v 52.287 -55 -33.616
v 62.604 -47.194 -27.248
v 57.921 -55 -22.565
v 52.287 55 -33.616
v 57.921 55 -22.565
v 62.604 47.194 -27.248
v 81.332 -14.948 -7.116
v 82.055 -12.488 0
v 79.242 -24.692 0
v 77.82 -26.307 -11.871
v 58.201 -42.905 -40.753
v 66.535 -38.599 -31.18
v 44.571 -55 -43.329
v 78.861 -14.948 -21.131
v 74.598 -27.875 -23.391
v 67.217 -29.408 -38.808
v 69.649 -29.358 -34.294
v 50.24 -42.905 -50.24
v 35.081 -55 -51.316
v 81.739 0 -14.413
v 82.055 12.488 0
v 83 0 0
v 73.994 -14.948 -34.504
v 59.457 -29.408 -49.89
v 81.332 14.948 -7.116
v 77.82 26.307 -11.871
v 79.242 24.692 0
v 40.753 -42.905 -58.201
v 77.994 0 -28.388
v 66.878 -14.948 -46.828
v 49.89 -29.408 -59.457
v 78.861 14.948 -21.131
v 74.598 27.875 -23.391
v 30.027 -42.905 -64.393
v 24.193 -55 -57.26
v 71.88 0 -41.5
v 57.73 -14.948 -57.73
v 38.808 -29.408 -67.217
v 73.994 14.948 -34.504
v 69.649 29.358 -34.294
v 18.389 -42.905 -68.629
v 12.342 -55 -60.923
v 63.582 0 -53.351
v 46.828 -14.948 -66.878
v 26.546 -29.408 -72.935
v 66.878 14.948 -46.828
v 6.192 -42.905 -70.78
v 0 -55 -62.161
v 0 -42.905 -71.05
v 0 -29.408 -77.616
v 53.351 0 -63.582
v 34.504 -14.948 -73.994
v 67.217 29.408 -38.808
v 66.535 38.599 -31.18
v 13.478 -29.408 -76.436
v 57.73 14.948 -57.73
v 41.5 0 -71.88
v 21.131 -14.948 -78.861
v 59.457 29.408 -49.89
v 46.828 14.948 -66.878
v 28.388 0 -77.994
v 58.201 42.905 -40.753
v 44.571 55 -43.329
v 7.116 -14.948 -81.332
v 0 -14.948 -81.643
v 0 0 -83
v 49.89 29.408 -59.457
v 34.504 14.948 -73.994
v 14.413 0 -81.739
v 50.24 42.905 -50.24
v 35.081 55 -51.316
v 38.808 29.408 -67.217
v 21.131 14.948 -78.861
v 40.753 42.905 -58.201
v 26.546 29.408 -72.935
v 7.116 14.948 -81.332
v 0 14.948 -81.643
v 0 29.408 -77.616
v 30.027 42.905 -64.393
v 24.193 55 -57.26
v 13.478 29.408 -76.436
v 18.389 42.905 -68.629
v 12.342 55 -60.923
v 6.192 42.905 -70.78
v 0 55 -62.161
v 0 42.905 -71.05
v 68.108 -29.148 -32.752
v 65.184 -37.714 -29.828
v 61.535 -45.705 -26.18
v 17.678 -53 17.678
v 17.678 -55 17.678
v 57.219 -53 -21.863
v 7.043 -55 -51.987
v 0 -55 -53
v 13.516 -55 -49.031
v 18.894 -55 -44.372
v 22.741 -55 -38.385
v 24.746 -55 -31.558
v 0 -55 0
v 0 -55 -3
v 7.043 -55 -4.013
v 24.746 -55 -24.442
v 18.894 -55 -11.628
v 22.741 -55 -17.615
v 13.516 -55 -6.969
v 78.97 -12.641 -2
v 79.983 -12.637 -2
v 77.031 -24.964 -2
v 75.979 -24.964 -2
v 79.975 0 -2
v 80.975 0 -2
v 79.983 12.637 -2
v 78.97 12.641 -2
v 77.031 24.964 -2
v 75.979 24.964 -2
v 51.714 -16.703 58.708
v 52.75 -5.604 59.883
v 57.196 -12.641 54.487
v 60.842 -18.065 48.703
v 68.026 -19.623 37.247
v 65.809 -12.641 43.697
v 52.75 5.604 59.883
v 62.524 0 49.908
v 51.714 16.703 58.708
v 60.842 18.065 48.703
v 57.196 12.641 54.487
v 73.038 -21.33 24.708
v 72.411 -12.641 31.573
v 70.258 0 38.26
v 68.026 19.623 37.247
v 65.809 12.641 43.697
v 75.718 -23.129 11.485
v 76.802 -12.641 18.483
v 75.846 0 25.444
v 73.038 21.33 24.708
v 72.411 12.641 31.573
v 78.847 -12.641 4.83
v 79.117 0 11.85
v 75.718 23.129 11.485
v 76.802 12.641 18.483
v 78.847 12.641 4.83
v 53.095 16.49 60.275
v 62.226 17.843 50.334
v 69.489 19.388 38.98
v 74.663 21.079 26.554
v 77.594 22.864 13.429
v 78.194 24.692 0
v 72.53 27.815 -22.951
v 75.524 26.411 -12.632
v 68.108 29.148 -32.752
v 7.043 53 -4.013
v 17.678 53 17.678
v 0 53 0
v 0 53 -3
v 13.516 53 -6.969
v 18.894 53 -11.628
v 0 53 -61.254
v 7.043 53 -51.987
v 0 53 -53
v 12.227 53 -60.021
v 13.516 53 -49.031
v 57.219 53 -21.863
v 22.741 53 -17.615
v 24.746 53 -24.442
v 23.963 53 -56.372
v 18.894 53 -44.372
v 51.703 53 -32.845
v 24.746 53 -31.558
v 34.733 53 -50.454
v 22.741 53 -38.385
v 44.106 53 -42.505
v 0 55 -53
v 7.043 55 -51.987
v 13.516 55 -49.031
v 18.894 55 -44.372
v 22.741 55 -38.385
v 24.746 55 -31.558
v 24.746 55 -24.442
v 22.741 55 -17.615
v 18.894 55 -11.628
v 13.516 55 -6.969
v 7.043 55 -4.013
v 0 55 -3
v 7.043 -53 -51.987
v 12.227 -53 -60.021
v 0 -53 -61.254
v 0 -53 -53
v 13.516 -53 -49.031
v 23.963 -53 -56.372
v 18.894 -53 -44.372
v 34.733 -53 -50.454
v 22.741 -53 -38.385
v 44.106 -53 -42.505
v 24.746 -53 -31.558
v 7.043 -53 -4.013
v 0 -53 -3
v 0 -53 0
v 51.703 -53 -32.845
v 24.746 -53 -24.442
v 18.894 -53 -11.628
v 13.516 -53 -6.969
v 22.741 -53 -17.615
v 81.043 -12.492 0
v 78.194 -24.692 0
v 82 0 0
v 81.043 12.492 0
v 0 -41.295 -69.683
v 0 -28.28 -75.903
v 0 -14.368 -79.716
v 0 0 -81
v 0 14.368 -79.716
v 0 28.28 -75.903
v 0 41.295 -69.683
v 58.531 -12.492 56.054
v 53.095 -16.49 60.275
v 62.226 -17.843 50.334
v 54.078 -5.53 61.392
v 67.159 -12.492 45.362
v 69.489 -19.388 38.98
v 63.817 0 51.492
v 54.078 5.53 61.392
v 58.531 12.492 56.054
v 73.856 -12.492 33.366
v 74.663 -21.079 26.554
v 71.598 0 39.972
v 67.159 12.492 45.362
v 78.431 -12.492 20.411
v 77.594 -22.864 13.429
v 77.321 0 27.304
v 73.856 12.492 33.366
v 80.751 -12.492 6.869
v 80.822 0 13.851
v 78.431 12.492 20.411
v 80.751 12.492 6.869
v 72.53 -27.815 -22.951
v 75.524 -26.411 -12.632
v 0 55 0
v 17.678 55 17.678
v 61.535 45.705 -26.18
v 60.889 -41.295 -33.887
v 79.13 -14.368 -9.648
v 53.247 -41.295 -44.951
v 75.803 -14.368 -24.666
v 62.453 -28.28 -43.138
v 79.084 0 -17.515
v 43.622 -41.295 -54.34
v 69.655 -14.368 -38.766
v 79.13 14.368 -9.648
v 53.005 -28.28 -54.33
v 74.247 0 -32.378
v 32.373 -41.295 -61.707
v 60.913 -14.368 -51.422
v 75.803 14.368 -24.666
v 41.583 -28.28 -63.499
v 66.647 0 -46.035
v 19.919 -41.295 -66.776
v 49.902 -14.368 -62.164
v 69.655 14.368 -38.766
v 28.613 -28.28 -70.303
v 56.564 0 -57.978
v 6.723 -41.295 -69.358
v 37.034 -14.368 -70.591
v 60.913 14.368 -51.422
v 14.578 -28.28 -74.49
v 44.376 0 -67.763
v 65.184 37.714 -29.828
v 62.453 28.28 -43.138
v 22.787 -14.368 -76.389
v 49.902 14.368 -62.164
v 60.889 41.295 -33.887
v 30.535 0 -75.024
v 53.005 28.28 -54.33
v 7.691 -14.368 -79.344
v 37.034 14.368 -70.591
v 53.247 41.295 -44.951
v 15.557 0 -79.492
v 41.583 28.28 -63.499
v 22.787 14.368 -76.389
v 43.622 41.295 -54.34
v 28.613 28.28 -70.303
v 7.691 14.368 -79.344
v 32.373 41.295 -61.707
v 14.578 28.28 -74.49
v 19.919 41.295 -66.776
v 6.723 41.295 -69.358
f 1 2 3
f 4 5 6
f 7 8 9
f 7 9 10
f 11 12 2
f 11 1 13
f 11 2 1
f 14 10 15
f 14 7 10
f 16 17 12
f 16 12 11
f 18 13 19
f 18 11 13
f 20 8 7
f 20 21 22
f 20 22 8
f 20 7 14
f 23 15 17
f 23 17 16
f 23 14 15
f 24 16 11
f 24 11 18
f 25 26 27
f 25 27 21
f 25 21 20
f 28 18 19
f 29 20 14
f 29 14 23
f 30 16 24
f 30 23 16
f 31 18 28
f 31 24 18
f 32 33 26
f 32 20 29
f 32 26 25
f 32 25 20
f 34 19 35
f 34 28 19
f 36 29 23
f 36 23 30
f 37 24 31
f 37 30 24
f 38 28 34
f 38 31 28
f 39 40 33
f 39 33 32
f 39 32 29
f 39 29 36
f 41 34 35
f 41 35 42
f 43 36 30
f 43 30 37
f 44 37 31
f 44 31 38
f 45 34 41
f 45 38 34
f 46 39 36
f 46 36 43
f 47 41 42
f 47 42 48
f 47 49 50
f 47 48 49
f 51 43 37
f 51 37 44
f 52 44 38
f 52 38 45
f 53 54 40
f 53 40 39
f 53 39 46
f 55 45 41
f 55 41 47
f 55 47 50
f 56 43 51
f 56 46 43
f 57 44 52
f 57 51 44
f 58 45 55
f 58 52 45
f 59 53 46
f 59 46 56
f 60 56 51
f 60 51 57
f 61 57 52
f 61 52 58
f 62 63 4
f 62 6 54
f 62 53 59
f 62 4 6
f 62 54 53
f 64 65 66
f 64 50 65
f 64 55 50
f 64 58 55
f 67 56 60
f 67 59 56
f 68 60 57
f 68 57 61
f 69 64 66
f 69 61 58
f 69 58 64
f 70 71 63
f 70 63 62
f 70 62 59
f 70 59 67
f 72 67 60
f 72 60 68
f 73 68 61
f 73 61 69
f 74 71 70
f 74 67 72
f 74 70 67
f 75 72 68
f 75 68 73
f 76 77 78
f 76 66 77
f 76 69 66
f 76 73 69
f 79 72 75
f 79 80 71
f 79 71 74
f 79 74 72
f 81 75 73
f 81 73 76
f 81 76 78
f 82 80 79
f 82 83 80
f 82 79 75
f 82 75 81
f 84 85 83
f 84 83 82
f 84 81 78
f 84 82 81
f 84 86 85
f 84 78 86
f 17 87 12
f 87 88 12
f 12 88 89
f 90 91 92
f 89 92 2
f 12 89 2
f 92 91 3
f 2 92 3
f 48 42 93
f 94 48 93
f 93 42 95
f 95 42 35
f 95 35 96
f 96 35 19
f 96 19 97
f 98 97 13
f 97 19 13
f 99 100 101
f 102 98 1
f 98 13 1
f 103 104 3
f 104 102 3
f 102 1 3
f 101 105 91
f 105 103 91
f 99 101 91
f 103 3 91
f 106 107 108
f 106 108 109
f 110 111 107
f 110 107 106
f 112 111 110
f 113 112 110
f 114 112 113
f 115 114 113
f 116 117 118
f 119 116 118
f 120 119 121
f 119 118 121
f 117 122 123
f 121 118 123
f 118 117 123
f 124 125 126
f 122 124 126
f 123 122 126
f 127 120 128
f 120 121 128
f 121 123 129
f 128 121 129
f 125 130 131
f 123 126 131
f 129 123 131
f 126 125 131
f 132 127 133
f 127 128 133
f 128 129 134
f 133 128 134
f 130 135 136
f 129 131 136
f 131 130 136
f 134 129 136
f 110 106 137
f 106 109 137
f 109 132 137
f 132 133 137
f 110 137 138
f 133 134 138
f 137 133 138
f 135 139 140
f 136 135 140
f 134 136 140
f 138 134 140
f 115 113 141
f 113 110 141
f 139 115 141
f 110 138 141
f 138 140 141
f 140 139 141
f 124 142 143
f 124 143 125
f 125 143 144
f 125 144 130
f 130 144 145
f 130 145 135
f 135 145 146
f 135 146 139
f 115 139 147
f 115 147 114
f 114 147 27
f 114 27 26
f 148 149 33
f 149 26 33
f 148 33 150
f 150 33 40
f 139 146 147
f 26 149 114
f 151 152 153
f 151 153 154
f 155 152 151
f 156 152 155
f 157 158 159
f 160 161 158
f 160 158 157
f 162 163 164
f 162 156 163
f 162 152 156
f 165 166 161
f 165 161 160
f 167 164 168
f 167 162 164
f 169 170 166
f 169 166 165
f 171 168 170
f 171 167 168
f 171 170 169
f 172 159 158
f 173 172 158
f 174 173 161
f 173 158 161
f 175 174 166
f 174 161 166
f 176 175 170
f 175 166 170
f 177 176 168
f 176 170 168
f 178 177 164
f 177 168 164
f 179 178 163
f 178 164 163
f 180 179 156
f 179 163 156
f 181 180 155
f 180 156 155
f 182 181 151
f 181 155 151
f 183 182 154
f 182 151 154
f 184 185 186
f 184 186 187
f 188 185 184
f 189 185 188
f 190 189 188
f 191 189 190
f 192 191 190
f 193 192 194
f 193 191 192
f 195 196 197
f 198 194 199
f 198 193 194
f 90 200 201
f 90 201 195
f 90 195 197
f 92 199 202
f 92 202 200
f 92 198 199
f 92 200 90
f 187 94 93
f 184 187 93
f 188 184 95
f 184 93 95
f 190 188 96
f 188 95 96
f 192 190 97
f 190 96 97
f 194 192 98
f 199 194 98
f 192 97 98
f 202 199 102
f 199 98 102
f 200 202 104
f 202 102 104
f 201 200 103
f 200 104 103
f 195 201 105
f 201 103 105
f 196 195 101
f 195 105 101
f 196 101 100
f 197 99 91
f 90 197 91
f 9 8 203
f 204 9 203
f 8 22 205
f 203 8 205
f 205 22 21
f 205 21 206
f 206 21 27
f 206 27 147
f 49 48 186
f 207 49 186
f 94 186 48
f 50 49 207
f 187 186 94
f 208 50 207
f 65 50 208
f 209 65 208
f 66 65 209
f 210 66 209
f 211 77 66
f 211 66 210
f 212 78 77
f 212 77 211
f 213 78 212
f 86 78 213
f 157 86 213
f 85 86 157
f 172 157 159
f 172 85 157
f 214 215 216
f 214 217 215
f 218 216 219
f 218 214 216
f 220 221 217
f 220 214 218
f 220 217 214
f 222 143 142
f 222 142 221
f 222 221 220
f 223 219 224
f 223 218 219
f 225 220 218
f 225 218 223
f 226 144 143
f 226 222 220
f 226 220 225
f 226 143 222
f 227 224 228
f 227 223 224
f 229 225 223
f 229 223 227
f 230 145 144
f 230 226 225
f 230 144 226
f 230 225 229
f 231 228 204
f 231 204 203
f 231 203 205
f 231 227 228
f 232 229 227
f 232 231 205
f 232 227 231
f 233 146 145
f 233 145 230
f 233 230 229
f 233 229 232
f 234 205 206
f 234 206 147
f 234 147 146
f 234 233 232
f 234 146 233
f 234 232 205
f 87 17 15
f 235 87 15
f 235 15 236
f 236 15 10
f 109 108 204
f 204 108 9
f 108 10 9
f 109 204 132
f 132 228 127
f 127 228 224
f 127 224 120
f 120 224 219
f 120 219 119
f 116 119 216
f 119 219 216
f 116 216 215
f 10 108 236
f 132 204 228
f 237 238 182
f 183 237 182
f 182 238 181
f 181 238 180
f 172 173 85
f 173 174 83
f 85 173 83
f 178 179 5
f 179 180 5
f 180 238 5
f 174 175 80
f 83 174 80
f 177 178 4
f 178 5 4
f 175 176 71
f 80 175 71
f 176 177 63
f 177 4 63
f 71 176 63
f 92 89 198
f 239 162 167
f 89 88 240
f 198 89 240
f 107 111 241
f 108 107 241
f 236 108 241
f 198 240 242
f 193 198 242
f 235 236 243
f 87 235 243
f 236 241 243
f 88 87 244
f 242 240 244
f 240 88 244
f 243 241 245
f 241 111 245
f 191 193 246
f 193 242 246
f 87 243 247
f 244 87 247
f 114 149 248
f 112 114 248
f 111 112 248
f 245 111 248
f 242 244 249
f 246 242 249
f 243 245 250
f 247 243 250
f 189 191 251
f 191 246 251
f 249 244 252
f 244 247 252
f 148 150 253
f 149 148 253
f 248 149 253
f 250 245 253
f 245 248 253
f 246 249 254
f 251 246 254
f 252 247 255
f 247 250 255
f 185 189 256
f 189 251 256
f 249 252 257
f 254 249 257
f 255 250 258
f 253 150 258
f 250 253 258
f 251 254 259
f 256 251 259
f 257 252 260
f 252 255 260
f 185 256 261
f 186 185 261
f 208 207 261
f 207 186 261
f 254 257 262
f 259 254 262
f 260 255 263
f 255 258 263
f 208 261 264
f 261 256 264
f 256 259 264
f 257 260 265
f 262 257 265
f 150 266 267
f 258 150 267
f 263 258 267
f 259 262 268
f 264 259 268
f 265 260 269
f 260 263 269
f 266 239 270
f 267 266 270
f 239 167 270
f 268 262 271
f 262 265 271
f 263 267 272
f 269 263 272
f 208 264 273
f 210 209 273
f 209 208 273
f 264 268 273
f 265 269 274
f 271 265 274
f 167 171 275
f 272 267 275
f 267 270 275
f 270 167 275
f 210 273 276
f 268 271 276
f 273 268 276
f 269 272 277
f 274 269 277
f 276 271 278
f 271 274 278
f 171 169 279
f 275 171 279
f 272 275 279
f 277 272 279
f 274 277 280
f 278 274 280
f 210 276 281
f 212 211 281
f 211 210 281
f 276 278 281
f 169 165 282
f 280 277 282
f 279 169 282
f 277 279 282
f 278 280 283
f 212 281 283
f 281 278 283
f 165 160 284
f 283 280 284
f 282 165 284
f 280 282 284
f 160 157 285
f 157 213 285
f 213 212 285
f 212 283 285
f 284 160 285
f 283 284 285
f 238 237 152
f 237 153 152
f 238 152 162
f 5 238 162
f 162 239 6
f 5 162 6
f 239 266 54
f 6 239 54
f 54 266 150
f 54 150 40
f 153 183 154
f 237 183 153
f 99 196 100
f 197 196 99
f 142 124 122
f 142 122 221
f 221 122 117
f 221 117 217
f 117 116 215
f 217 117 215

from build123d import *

# Parameters (mm, degrees)
REVOLVE1_ANGLE      = 180
CUT_EXTRUDE1_DEPTH  = 173.874496063
BOSS_EXTRUDE1_DEPTH = 100
CUT_EXTRUDE2_DEPTH  = 161.866404199
CUT_REVOLVE2_ANGLE  = 90
SKETCH7_R           = 25
CUT_EXTRUDE3_DEPTH  = 161.866404199
SHELL1_T            = -2


with BuildPart() as part:
    # Sketch1 → Revolve1 (revolve)
    with BuildSketch(Plane(origin=(0, 0, 0), x_dir=(0, 0, -1), z_dir=(1, 0, 0))):
        with BuildLine():
            Line((0, -55), (0, 55))
            Line((0, 55), (-76.60153846, 55))
            ThreePointArc((-76.60153846, 55), (-94.301620847, 0), (-76.60153846, -55))
            Line((-76.60153846, -55), (0, -55))
        make_face()
    revolve(axis=Axis((0, -55, 0), (0, 1, 0)), revolution_arc=REVOLVE1_ANGLE)

    # Sketch2 → Cut-Extrude1 (cut, through all)
    with BuildSketch(Plane.XZ.offset(55)):
        Polygon((0, 0), (17.67766953, 17.67766953), (110.975280637, -75.619941577), (110.975280637, 155.951540754), (-110.127783366, 155.951540754), (-110.127783366, 0), align=None)
    extrude(amount=-CUT_EXTRUDE1_DEPTH, mode=Mode.SUBTRACT)

    # Sketch3 → Boss-Extrude1 (add)
    with BuildSketch(Plane(origin=(100, 0, 0), x_dir=(0, 0, -1), z_dir=(1, 0, 0))):
        Polygon((-71.226029464, -15), (-71.226029464, 15), (39.011689542, 30), (39.011689542, -30), align=None)
    extrude(amount=-BOSS_EXTRUDE1_DEPTH)

    # Sketch4 → Cut-Revolve1 (revolve, cut)
    with BuildSketch(Plane(origin=(0, 0, 0), x_dir=(0, 0, -1), z_dir=(1, 0, 0))):
        with BuildLine():
            Line((-59.361204271, 58.010752688), (-134.505556561, 58.010752688))
            ThreePointArc((-134.505556561, 58.010752688), (-146.4820541, 0), (-134.505556561, -58.010752688))
            Line((-134.505556561, -58.010752688), (-59.361204271, -58.010752688))
            ThreePointArc((-59.361204271, -58.010752688), (-83, 0), (-59.361204271, 58.010752688))
        make_face()
    revolve(axis=Axis((0, 0, 0), (0, 1, 0)), mode=Mode.SUBTRACT)

    # Sketch5 → Cut-Extrude2 (cut, through all)
    with BuildSketch(Plane.XZ.offset(55)):
        Polygon((0, 0), (70.470143291, 80), (-50.338034401, 80), (-50.338034401, 0), align=None)
    extrude(amount=-CUT_EXTRUDE2_DEPTH, mode=Mode.SUBTRACT)

    # Sketch6 → Cut-Revolve2 (revolve, cut)
    with BuildSketch(Plane(origin=(0, 0, 0), x_dir=(0, 0, -1), z_dir=(1, 0, 0))):
        with BuildLine():
            Line((-48.985500868, 65.760327742), (-101.43758046, 65.760327742))
            ThreePointArc((-101.43758046, 65.760327742), (-120.888392471, 0), (-101.43758046, -65.760327742))
            Line((-101.43758046, -65.760327742), (-48.985500868, -65.760327742))
            ThreePointArc((-48.985500868, -65.760327742), (-82, 0), (-48.985500868, 65.760327742))
        make_face()
    revolve(axis=Axis((0, 0, 0), (0, 1, 0)), revolution_arc=CUT_REVOLVE2_ANGLE, mode=Mode.SUBTRACT)

    # Sketch7 → Cut-Extrude3 (cut, through all)
    with BuildSketch(Plane.XZ.offset(55)):
        with Locations((0, -28)):
            Circle(SKETCH7_R)
    extrude(amount=-CUT_EXTRUDE3_DEPTH, mode=Mode.SUBTRACT)

    # Shell1
    shell1_openings = [part.faces().sort_by_distance(p)[0] for p in [
        (0, 0, -65.508602259),
        (25, 0, -28),
        (8.951286878, 39.236848999, 8.951286878),
        (8.951286878, -39.236848999, 8.951286878),
        (53.49764896, 22.71356766, 14.537622511),
        (53.49764896, -22.71356766, 14.537622511),
        (40.440192864, 39.71059478, -5.084853804),
        (40.440192864, -39.71059478, -5.084853804),
        (0, 0, -1.5),
        (25.1022253, 0, 28.496863072),
    ]]
    offset(amount=SHELL1_T, openings=shell1_openings, kind=Kind.INTERSECTION)


solid = part.part
